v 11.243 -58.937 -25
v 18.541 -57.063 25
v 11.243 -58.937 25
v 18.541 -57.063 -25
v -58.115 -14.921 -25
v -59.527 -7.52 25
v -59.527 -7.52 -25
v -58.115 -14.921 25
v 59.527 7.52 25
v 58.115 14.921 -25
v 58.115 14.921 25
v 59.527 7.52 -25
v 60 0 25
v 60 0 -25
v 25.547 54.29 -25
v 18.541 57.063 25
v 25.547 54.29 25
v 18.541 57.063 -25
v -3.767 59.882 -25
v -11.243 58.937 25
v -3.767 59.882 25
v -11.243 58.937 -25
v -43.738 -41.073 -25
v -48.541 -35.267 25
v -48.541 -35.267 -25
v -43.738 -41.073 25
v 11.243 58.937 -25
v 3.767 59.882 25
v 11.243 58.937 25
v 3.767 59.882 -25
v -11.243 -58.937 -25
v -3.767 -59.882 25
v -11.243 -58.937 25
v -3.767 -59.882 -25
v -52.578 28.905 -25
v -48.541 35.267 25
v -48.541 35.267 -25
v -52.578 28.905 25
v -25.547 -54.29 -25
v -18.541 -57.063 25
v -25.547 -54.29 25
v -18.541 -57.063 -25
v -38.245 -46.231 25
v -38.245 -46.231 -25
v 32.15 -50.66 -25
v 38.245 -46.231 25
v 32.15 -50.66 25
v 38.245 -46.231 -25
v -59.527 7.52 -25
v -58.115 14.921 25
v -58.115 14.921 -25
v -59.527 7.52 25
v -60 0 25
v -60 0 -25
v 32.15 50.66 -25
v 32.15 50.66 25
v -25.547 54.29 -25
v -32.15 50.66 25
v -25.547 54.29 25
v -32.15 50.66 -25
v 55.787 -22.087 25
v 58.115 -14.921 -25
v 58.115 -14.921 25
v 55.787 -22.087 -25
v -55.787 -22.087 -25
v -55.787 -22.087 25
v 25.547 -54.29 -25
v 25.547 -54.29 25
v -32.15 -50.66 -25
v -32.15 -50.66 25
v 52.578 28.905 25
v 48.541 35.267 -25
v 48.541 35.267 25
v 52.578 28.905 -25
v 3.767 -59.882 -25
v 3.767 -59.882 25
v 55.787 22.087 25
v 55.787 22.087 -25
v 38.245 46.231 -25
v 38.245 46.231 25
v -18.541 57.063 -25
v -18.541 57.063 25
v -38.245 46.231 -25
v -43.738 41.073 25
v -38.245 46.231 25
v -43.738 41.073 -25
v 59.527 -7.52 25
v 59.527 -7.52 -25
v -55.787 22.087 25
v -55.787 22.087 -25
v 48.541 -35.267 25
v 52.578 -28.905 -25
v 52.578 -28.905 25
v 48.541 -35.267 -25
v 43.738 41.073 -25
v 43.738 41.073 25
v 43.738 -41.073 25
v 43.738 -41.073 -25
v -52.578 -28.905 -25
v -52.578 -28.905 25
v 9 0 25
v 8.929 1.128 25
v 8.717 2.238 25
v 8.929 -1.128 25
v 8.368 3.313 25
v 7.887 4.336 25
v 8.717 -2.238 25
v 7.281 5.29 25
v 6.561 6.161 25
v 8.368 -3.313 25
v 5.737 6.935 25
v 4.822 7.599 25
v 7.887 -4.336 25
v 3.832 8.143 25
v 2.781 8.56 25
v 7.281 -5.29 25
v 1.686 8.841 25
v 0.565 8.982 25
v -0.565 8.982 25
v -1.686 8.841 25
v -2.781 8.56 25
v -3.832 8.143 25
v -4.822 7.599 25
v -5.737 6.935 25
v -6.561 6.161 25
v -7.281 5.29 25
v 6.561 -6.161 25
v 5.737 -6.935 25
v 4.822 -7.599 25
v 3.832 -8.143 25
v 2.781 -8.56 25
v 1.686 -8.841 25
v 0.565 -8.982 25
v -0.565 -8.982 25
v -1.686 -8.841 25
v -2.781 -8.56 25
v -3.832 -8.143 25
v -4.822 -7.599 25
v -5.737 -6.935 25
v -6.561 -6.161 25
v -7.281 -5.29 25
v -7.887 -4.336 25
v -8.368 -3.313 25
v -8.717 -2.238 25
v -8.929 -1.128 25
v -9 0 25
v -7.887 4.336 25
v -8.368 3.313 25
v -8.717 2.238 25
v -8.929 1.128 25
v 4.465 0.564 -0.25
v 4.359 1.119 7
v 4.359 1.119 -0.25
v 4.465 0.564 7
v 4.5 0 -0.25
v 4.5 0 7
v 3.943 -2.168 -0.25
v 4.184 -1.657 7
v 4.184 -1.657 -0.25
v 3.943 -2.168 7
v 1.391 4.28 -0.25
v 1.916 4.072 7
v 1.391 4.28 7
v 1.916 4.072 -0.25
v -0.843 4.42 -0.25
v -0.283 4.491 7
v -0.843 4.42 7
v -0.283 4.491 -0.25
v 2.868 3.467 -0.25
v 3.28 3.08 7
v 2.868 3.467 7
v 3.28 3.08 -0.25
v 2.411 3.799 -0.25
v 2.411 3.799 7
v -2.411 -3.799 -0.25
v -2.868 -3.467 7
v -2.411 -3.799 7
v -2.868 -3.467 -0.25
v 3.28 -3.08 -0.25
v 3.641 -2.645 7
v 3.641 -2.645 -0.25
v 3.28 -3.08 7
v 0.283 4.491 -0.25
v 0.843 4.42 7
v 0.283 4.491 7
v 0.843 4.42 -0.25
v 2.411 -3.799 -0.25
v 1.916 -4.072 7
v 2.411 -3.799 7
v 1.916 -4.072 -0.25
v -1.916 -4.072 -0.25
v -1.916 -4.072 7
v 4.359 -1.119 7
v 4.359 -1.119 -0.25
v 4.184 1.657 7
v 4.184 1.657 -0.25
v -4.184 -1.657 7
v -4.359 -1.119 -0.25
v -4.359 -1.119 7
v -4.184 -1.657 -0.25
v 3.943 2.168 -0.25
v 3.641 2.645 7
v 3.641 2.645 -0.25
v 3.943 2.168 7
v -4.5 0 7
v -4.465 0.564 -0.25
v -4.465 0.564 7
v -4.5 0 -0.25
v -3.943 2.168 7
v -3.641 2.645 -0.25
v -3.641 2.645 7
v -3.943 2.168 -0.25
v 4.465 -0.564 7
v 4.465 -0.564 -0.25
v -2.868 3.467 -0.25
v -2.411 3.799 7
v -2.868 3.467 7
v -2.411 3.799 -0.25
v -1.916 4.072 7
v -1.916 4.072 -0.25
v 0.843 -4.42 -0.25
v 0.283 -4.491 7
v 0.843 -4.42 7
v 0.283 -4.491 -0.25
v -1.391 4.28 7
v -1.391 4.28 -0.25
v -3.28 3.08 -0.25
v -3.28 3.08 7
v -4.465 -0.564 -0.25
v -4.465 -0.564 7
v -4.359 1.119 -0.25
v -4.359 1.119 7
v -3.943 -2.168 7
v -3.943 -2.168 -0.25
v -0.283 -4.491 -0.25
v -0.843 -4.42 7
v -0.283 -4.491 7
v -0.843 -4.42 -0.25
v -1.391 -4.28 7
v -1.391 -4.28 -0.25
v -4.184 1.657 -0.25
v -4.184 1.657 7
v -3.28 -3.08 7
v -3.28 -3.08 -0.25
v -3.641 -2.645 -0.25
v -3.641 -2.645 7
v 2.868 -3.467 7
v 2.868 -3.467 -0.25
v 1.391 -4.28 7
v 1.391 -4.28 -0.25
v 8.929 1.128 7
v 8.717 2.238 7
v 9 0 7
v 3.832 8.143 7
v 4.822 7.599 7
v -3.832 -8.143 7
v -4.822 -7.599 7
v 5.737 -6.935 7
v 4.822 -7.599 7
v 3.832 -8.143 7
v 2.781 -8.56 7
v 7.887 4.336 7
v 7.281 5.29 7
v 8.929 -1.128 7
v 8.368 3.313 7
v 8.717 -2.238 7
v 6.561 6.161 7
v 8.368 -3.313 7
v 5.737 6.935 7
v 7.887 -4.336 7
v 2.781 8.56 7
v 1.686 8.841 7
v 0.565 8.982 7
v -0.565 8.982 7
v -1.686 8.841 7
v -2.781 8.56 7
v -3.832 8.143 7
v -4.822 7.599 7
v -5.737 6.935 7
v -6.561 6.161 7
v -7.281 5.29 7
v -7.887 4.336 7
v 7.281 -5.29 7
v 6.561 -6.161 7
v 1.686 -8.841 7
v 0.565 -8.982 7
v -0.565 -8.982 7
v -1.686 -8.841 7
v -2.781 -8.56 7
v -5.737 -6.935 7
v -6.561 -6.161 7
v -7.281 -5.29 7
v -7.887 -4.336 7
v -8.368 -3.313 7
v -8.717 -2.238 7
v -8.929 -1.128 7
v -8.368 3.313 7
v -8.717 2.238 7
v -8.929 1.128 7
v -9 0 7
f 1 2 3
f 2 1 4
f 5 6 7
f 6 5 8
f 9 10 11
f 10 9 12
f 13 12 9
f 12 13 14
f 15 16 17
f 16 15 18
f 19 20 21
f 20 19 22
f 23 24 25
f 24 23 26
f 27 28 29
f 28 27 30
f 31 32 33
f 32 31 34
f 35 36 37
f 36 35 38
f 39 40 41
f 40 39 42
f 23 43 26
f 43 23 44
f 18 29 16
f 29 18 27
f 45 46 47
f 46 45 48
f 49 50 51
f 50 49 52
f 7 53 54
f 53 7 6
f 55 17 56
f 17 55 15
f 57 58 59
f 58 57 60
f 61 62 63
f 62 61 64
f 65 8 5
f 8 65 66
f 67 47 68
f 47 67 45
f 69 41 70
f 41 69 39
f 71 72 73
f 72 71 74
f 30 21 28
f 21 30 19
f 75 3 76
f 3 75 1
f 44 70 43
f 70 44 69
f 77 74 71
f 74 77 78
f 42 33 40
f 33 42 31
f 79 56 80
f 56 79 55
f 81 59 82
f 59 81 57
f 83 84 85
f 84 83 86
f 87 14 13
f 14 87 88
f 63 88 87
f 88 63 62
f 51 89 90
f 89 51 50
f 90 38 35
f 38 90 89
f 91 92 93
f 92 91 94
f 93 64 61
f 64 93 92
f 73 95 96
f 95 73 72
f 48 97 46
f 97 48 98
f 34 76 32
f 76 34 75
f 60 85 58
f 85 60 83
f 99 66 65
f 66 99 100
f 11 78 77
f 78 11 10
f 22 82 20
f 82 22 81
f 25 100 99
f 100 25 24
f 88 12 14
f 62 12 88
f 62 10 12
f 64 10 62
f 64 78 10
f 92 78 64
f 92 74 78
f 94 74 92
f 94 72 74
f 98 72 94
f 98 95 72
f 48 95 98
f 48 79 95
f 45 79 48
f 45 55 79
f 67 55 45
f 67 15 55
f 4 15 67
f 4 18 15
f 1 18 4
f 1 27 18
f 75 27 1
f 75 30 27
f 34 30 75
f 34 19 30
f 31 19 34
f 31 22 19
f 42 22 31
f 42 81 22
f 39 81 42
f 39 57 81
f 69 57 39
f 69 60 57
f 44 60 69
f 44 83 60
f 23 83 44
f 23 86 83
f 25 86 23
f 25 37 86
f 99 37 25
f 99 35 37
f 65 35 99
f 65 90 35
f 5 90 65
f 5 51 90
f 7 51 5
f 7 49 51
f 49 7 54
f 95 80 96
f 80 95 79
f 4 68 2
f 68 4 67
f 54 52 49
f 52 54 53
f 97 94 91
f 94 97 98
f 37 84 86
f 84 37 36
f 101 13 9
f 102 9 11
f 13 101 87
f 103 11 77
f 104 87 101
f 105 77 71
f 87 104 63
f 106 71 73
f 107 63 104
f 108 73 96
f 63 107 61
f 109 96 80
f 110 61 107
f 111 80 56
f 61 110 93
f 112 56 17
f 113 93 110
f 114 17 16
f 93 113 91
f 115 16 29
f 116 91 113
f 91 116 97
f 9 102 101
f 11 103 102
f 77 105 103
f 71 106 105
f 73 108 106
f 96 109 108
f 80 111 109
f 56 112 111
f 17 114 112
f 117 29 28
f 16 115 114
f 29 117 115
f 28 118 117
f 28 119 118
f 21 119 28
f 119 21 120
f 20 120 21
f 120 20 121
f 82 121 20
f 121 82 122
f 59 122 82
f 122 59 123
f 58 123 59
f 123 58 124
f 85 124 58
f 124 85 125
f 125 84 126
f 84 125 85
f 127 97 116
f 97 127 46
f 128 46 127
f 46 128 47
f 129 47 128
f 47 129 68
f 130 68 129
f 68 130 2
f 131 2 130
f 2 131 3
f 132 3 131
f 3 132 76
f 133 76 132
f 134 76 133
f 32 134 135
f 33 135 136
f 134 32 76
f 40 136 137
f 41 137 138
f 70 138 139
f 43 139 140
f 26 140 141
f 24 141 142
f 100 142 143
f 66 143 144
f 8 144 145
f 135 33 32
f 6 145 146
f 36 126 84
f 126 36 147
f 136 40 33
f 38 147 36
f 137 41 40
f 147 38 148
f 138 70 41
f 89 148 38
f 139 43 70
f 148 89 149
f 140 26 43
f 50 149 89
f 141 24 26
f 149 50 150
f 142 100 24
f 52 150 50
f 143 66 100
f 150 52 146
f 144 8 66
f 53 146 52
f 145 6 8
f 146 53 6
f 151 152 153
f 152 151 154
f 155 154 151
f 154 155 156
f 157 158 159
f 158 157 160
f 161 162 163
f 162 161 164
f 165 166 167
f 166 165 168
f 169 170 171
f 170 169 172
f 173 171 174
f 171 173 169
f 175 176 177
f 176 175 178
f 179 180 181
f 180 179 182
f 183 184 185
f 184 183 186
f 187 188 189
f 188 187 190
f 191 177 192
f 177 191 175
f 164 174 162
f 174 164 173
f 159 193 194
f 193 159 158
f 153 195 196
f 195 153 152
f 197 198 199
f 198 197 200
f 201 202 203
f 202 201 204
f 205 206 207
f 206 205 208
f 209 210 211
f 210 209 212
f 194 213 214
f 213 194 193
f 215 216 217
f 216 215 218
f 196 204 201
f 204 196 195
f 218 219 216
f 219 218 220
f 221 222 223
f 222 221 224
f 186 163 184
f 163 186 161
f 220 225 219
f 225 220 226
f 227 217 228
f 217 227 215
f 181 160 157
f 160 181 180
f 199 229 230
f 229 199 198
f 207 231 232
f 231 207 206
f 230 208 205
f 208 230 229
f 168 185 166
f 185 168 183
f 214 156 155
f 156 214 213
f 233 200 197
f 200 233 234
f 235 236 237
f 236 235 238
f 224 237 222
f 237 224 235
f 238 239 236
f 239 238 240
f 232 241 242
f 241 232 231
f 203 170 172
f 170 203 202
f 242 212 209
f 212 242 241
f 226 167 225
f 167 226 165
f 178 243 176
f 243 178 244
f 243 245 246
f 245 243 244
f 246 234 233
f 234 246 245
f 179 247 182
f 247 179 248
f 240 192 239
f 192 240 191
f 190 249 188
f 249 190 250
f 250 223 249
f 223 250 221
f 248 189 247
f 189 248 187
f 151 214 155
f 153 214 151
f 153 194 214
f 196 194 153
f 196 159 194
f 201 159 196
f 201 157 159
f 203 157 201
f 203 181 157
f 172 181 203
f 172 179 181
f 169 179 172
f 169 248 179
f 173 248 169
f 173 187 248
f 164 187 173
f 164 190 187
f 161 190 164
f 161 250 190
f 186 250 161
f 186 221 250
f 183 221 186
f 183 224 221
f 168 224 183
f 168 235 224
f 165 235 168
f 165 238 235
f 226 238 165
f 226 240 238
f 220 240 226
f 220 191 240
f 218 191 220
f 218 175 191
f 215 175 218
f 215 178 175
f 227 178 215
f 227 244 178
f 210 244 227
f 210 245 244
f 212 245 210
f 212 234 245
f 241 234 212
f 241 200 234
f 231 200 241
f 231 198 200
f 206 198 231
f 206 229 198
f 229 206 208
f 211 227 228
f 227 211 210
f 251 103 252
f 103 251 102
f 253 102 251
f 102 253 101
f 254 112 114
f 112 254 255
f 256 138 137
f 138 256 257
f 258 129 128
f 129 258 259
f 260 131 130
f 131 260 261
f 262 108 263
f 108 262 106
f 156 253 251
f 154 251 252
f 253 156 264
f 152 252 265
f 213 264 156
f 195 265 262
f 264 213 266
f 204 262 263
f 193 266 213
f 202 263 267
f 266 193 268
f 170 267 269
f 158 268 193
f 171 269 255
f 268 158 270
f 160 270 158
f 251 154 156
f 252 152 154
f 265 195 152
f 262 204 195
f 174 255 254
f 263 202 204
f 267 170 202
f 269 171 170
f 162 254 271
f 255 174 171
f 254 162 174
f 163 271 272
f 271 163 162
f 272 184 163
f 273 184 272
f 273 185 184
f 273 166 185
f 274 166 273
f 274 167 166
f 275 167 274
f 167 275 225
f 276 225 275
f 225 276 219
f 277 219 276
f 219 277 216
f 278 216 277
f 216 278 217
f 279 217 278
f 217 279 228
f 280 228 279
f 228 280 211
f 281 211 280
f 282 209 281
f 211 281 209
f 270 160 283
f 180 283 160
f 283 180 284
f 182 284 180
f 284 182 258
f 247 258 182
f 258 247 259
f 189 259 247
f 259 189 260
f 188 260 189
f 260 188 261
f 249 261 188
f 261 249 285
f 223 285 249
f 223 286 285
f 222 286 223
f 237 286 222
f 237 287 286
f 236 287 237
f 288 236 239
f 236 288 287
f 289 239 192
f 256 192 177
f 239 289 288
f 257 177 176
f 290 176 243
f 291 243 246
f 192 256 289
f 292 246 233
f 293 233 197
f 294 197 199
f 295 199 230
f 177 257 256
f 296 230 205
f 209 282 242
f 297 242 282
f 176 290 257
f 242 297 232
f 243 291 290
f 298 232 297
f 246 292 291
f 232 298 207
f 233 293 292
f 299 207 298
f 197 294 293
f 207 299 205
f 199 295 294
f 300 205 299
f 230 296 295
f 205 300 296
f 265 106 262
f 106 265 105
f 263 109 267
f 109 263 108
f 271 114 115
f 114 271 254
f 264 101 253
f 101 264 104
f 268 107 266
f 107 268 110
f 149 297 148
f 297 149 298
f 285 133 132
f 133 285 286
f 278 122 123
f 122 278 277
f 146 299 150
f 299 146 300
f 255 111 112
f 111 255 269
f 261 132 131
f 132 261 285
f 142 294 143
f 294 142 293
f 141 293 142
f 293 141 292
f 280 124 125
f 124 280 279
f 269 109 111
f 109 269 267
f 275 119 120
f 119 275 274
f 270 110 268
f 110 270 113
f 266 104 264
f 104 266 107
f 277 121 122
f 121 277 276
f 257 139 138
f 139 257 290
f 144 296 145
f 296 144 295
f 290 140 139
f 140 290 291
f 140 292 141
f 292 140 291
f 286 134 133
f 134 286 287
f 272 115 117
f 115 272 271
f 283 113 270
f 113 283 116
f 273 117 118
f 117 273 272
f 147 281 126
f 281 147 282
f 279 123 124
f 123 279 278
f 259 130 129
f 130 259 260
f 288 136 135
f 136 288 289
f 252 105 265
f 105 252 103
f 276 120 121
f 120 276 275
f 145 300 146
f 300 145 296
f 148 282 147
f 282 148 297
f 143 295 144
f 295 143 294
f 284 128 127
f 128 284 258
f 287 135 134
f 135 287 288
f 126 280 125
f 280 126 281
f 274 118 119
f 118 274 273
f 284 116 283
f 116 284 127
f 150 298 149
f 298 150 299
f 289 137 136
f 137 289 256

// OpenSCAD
include <../../Parameters.scad>
draft = true;

$fs = draft?50:100;
//$fa  = 10;
 


camera_angle = 30; 
camera_diameter = 120; 
camera_holder_height = 50 ;

module 888_3008(draft){    /////// 1. díl (AZ, YAW)

    difference(){
        cylinder(d = camera_diameter, h= camera_holder_height, $fn=draft?50:100, center = true);

        /*rotate([0, camera_angle, 0])
            translate([0,0, camera_diameter/2   + 20])
                cube([2*camera_diameter, 2*camera_diameter, camera_diameter], center = true);
*/
        translate([0,0,-global_clearance/2])
            cylinder(d=M8_screw_diameter, h=g3_8_magnet_wall_thickness+global_clearance, $fn=draft?50:100);
        
        
            // dira skrz pro lozisko
            translate([0,0, g3_8_magnet_wall_thickness])
                cylinder(d = bearing_efsm_08_db, h = g3_8_cylinder_h+global_clearance, $fn =  draft ? 50 :100);
            
            // diry pro pripevneni kamery
            // prumer kruznice na ktere jsou umisteny srouby
            camera_screws_position = 94 - 2*5.5 - 5.5;

            %for (i=[0:2]) 
                rotate([0, 0, 120*i]){
                    translate([0, camera_screws_position/2, -global_clearance/2])
                        cylinder(h = camera_holder_height, d=M4_screw_diameter, $fn=draft? 50:100);

                    
                    translate([0, camera_screws_position/2, -M4_nut_height - 0.5 + g3_8_pocket_wall])
                        rotate([0, 0, 30])
                            cylinder(h = M4_nut_height + global_clearance, d = M4_nut_diameter, $fn = 6);
                
                    translate([-M4_nut_pocket/2, camera_screws_position/2, -M4_nut_height - 0.5 + g3_8_pocket_wall])
                        cube([M4_nut_pocket, 100, M4_nut_height + global_clearance]);
                }
    }
}

difference(){
888_3008(draft);
//translate([0,0,-1]) rotate([0,0,45]) cube(200);
}
